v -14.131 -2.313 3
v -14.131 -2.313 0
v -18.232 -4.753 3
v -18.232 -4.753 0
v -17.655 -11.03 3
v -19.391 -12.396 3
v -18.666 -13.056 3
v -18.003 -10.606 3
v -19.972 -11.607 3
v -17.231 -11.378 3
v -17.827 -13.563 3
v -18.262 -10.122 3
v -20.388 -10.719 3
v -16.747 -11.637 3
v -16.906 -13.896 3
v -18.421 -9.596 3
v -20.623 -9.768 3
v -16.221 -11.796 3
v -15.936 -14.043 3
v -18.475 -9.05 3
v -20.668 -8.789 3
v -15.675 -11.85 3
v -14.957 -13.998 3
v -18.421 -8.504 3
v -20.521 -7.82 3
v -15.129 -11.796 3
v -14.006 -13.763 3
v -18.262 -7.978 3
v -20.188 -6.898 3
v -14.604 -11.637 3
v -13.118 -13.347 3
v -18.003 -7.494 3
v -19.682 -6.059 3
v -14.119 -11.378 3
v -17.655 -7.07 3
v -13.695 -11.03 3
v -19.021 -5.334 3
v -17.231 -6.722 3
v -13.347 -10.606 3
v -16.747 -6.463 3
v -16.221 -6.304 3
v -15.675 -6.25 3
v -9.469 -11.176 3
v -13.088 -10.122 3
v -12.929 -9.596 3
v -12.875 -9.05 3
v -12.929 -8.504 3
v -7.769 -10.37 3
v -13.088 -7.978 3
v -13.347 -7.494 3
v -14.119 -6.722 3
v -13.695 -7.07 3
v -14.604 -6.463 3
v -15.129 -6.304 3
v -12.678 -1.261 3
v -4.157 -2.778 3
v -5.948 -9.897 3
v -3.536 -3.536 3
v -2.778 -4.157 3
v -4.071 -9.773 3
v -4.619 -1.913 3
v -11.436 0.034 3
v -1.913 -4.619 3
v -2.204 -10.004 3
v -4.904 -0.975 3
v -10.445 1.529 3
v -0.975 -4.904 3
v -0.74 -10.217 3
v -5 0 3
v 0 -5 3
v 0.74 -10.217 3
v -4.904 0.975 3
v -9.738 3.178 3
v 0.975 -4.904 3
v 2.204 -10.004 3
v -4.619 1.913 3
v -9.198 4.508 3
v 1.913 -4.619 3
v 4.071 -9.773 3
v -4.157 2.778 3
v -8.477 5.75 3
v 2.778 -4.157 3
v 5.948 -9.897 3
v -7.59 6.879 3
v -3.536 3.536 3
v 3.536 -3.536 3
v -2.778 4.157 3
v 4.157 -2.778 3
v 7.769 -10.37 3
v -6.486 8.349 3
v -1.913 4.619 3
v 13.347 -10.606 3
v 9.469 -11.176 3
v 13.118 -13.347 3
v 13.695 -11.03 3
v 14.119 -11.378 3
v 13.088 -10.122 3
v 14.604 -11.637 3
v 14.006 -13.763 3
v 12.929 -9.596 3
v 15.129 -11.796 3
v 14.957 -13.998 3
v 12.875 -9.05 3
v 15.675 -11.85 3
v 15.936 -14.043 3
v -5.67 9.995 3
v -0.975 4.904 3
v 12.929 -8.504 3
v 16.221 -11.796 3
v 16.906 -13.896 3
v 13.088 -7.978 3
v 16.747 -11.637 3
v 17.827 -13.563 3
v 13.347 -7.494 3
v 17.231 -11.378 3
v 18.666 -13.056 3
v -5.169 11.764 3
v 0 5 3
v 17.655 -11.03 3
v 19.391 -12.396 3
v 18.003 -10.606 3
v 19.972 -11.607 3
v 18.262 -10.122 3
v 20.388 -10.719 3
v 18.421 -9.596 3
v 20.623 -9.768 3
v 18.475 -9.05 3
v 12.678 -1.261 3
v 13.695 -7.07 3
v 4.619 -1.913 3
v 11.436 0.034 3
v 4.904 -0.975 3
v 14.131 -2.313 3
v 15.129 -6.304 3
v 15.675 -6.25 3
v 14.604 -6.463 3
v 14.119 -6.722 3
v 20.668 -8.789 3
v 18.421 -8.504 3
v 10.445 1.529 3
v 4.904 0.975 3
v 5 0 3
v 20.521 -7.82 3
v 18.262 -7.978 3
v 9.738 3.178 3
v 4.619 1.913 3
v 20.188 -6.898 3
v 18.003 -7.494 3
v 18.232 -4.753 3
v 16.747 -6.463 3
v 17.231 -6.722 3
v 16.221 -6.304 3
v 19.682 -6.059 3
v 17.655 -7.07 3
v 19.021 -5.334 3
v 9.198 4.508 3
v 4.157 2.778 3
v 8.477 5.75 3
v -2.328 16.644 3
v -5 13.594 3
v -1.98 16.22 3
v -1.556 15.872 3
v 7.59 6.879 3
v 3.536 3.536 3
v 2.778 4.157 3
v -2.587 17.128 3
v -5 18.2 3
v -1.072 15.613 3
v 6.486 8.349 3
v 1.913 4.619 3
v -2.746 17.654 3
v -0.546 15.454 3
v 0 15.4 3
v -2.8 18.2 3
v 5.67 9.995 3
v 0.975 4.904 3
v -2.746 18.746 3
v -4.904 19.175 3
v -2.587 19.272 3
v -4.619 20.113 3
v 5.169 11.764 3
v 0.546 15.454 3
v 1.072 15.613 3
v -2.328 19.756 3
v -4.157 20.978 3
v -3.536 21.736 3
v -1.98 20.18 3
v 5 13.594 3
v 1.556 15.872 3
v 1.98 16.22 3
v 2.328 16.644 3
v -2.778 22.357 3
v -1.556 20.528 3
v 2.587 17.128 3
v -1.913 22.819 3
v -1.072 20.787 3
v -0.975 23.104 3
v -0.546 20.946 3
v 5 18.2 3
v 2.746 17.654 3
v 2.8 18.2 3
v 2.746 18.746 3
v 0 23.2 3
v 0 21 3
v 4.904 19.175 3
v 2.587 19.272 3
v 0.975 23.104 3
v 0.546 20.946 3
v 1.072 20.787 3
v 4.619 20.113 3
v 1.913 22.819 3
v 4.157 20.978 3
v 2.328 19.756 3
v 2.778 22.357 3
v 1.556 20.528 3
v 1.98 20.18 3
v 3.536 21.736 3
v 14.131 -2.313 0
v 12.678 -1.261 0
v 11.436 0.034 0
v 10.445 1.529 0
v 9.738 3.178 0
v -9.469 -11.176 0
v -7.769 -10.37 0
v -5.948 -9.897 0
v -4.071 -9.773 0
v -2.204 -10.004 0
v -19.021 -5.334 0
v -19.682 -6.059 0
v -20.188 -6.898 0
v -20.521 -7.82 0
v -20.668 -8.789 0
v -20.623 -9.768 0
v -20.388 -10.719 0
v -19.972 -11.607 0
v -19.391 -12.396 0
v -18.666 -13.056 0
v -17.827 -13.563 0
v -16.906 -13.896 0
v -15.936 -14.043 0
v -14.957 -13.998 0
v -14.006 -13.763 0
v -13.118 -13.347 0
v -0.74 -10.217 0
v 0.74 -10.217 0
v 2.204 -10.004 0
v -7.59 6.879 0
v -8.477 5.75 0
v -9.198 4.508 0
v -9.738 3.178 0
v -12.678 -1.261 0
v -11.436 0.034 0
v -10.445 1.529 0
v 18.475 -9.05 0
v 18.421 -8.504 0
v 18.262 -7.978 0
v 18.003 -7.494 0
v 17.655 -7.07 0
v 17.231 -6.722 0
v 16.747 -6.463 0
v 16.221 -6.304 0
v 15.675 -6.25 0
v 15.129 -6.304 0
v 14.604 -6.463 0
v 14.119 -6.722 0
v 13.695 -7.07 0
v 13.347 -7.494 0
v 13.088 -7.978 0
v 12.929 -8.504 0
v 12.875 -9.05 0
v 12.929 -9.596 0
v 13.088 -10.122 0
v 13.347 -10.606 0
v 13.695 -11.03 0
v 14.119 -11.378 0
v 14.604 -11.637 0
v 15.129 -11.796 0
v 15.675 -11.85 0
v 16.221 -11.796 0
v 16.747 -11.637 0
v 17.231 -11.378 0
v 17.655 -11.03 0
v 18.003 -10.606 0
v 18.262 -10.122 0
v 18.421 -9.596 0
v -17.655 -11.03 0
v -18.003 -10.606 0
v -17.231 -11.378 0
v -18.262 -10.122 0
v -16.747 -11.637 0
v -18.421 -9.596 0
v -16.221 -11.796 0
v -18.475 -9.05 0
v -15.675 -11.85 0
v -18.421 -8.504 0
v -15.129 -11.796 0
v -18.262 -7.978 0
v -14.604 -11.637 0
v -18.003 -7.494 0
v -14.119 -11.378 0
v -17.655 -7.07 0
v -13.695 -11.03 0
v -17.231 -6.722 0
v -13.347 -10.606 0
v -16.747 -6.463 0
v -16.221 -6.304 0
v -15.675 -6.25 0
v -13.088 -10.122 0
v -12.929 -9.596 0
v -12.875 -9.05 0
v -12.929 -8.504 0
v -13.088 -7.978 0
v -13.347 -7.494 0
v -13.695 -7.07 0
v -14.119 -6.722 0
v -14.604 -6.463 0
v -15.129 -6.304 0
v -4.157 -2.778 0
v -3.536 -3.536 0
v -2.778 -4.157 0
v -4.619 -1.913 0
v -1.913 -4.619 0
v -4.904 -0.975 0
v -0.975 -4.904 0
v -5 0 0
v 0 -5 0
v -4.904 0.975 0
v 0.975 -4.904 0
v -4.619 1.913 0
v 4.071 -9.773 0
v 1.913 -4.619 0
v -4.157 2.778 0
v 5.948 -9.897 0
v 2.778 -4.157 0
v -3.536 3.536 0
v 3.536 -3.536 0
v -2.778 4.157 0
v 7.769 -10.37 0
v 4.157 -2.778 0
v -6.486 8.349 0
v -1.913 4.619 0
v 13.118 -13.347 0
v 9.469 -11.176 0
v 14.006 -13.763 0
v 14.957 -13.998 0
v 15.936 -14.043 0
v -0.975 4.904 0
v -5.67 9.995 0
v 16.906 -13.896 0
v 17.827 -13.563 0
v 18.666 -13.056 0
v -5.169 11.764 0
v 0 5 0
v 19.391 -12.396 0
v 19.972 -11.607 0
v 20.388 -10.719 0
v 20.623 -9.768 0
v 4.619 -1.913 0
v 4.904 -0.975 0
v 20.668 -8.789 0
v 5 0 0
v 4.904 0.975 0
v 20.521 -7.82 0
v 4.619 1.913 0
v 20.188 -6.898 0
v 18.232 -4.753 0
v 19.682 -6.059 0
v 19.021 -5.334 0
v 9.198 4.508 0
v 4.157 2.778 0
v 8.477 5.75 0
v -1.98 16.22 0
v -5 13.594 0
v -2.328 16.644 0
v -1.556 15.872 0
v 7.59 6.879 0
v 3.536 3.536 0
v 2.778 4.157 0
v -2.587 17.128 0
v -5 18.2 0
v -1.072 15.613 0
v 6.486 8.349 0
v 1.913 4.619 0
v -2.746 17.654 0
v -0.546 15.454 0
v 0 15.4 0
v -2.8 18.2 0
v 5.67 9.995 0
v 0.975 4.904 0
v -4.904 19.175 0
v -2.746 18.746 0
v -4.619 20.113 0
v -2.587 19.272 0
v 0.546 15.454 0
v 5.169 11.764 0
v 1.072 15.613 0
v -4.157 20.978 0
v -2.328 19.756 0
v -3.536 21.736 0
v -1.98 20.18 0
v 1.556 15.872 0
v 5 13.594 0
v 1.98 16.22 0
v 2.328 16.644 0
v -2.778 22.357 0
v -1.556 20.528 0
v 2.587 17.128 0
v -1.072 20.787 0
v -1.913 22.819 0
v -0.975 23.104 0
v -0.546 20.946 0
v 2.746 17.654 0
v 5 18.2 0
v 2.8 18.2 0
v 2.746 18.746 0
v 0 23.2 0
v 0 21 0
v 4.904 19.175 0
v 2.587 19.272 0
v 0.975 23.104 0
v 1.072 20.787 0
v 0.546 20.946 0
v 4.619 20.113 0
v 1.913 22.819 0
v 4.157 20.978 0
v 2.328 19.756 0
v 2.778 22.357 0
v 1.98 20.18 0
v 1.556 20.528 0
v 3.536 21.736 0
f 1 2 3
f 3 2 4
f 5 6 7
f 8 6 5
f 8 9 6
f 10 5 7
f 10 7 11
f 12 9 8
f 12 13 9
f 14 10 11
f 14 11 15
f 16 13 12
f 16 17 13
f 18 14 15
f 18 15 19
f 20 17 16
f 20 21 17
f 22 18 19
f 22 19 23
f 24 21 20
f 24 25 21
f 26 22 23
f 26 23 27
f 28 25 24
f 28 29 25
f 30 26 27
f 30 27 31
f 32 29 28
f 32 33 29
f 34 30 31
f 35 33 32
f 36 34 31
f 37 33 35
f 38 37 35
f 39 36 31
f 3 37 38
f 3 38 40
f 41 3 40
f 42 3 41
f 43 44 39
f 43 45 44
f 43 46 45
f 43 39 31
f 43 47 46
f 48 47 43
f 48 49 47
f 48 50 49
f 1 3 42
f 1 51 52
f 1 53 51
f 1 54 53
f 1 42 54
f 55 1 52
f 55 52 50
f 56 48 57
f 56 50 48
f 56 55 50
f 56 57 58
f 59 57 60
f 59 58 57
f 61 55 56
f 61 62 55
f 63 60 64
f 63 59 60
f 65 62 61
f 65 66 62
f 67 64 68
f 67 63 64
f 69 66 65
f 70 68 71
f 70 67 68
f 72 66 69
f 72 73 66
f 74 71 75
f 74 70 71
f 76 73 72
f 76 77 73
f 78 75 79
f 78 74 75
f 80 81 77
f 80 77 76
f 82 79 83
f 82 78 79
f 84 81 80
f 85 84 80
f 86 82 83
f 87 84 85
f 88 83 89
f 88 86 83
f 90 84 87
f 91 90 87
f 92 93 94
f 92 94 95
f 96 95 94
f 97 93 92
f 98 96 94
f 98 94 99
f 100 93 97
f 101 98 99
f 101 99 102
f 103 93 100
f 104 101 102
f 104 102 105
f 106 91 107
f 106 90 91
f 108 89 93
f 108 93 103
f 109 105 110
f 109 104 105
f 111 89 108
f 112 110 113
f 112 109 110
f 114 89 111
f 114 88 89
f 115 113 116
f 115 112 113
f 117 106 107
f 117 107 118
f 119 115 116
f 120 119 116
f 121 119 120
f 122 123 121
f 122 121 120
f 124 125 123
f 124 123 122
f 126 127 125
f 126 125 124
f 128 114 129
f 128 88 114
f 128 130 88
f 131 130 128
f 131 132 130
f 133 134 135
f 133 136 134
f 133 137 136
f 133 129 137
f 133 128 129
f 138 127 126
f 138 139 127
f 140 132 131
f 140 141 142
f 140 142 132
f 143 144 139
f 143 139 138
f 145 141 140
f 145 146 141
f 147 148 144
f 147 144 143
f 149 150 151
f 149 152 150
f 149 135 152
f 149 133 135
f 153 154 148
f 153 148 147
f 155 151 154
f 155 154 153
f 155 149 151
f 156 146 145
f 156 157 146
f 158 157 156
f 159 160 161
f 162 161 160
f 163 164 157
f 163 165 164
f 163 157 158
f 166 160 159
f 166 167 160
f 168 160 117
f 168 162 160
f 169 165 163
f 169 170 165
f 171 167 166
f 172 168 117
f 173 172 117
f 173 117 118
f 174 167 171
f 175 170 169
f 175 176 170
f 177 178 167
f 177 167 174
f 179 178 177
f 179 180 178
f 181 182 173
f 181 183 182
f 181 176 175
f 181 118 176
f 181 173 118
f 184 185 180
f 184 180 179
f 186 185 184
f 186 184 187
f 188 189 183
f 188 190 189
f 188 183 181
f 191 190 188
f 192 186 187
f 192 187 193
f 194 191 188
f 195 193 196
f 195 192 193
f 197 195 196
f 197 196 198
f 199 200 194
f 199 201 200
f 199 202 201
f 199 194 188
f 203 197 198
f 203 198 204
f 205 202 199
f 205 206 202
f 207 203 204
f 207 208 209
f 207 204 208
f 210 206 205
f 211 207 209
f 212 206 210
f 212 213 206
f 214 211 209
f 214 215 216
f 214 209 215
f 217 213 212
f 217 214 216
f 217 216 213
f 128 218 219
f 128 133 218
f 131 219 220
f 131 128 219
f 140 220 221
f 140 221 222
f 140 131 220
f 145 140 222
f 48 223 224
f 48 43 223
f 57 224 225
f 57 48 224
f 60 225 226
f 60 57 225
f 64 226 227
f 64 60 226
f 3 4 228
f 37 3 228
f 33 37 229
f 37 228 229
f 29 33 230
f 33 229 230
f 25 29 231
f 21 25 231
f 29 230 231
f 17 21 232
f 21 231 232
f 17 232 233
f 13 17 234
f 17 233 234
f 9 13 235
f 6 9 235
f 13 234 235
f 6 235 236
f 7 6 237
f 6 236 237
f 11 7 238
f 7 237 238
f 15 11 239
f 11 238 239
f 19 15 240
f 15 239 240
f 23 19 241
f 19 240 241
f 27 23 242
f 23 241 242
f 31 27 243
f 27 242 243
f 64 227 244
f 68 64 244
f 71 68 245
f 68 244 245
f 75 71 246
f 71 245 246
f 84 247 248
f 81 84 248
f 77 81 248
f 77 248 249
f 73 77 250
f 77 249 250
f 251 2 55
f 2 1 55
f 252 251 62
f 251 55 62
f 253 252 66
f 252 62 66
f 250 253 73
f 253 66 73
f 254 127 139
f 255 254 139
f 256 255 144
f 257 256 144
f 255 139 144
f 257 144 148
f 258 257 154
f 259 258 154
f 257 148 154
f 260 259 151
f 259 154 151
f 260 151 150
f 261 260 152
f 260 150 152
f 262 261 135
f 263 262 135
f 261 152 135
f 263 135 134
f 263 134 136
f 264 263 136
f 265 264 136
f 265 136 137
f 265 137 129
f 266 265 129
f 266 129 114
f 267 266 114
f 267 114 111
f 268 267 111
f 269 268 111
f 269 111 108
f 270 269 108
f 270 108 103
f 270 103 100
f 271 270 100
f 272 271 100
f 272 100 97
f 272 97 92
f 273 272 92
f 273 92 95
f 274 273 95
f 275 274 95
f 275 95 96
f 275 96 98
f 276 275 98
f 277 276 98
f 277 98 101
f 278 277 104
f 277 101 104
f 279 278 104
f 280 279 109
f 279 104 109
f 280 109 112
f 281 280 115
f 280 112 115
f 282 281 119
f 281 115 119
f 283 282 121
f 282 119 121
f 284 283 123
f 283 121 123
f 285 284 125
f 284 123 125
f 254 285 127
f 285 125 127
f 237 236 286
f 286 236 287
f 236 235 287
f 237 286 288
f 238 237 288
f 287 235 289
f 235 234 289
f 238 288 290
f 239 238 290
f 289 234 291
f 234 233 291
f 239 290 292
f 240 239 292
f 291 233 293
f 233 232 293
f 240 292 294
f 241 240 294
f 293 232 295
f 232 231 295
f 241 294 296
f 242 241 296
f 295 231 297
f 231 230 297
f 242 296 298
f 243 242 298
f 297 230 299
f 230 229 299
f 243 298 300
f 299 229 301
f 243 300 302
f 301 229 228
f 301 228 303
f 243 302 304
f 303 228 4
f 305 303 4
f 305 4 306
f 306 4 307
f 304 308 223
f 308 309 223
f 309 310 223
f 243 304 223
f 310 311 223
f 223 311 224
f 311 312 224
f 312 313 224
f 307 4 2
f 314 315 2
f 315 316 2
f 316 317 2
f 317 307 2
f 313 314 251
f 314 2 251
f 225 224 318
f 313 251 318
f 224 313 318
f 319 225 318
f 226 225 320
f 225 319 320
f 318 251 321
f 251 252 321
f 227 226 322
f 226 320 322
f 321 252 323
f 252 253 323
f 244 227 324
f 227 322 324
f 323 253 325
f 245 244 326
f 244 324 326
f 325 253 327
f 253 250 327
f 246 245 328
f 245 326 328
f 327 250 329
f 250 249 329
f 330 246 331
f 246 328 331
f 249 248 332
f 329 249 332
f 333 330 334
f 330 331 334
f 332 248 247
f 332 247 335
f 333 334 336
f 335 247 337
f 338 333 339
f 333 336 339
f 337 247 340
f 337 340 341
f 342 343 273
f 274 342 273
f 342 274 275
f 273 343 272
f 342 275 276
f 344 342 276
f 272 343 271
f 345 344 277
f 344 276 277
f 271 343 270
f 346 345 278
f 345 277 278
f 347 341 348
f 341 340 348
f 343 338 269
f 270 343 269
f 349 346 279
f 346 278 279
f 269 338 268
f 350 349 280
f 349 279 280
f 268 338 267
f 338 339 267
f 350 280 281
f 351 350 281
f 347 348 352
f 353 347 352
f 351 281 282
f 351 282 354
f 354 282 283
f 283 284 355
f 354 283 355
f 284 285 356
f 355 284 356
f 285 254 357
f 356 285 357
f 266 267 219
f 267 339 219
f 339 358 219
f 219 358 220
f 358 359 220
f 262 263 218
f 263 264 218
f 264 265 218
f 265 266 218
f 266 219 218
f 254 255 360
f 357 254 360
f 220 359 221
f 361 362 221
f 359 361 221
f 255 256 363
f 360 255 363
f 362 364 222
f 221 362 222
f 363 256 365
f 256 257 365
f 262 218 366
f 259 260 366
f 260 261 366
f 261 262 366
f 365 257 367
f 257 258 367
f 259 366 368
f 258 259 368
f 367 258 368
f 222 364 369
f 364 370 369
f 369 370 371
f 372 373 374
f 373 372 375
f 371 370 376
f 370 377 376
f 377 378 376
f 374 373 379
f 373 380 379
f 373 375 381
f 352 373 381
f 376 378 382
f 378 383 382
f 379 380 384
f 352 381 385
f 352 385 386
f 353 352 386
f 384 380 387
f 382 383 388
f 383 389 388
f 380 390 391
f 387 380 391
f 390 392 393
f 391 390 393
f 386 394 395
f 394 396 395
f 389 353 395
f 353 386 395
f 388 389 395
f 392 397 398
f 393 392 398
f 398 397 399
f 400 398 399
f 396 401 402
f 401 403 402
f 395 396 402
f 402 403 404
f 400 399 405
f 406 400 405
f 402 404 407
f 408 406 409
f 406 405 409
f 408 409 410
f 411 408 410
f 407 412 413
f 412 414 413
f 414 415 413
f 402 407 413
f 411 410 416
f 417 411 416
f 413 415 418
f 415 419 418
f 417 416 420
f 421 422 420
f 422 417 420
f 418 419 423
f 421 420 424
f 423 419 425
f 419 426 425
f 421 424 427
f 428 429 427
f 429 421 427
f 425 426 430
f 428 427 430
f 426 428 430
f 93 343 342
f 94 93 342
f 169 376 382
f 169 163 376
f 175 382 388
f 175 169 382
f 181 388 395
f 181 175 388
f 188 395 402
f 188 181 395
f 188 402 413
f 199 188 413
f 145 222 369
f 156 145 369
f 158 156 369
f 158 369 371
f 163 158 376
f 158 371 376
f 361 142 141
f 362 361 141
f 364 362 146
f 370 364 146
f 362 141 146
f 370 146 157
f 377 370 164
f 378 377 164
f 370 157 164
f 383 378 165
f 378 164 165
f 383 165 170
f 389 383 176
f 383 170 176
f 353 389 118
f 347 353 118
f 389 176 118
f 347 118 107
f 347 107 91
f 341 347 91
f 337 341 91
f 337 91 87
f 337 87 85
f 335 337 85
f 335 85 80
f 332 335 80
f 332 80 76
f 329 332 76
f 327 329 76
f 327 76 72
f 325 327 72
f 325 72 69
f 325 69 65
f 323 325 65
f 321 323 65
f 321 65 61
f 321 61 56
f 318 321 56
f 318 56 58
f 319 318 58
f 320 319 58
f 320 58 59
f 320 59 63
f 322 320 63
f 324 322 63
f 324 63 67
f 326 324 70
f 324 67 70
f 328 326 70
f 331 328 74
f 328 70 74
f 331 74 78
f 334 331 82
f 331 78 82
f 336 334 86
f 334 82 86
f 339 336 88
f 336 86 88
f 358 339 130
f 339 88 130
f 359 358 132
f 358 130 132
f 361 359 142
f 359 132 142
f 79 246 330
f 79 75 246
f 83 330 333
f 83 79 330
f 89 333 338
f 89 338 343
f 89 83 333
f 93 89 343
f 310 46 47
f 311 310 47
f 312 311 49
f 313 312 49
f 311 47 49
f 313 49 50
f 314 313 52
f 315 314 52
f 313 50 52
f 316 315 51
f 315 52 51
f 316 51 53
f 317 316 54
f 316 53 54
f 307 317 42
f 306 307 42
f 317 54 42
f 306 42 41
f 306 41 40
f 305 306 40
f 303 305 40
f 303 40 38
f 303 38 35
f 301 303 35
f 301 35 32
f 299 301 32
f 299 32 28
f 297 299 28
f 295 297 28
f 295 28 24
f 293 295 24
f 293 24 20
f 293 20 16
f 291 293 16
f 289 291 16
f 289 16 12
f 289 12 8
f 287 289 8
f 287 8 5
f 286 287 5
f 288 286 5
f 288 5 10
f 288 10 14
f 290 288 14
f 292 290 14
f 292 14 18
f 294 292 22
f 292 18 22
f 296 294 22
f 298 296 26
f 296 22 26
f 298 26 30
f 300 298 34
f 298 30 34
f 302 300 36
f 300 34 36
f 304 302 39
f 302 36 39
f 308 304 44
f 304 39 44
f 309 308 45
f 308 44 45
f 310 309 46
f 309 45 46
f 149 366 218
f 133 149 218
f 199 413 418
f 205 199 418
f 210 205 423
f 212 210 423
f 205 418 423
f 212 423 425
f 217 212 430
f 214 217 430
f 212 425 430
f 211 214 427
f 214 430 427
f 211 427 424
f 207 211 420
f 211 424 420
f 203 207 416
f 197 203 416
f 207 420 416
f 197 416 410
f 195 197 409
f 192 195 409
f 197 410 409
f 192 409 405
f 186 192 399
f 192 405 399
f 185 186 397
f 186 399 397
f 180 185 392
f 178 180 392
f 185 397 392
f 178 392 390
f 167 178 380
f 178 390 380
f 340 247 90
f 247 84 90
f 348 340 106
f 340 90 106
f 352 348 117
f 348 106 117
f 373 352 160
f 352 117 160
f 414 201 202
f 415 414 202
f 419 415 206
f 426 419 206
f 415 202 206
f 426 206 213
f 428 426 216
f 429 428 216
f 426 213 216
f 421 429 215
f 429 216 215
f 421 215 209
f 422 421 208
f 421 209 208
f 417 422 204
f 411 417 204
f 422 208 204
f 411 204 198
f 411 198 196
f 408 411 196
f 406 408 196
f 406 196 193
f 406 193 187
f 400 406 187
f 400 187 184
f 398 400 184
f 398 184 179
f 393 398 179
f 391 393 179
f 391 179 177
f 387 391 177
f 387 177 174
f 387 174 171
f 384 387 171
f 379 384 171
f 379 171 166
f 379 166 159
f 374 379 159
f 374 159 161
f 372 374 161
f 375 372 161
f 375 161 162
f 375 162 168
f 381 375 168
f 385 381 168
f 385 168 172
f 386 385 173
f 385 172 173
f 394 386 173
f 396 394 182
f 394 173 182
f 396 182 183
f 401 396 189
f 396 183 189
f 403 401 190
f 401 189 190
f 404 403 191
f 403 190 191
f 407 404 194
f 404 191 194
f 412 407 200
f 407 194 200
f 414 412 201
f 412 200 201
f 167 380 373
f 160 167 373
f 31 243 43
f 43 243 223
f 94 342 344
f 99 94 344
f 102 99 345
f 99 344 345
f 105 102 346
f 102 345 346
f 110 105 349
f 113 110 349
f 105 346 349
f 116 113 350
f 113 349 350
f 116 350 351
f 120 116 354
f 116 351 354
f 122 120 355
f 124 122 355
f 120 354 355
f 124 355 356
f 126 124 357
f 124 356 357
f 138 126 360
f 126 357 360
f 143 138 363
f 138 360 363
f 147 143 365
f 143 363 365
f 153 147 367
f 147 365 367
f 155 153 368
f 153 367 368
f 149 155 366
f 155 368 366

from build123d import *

# Parameters (mm, degrees)
SALIENTE_EXTRUIR1_DEPTH = 3
CROQUIS2_R              = 2.8
CORTAR_EXTRUIR1_DEPTH   = 10
CROQUIS3_R              = 5
CORTAR_EXTRUIR2_DEPTH   = 10
REDONDEO1_R             = 10


with BuildPart() as part:
    # Croquis1 → Saliente-Extruir1 (new body)
    with BuildSketch(Plane.XY):
        with BuildLine():
            Line((-13.118348224, -13.346885602), (-5.358962429, -8.729934305))
            ThreePointArc((-5.358962429, -8.729934305), (0, -10.243545836), (5.358962429, -8.729934305))
            Line((5.358962429, -8.729934305), (13.118348224, -13.346885602))
            ThreePointArc((13.118348224, -13.346885602), (19.97194541, -11.606711584), (18.231771393, -4.753114398))
            Line((18.231771393, -4.753114398), (10.243545836, 0))
            ThreePointArc((10.243545836, 0), (8.83594818, 5.182301714), (5, 8.94037087))
            Line((5, 8.94037087), (5, 18.2))
            ThreePointArc((5, 18.2), (0, 23.2), (-5, 18.2))
            Line((-5, 18.2), (-5, 8.94037087))
            ThreePointArc((-5, 8.94037087), (-8.83594818, 5.182301714), (-10.243545836, 0))
            Line((-10.243545836, 0), (-18.231771393, -4.753114398))
            ThreePointArc((-18.231771393, -4.753114398), (-19.97194541, -11.606711584), (-13.118348224, -13.346885602))
        make_face()
    extrude(amount=SALIENTE_EXTRUIR1_DEPTH)

    # Croquis2 → Cortar-Extruir1 (cut)
    with BuildSketch(Plane.XY.offset(3)):
        with Locations((0, 18.2)):
            Circle(CROQUIS2_R)
        with Locations((15.675059808, -9.05)):
            Circle(CROQUIS2_R)
        with Locations((-15.675059808, -9.05)):
            Circle(CROQUIS2_R)
    extrude(amount=-CORTAR_EXTRUIR1_DEPTH, mode=Mode.SUBTRACT)

    # Croquis3 → Cortar-Extruir2 (cut)
    with BuildSketch(Plane.XY.offset(3)):
        Circle(CROQUIS3_R)
    extrude(amount=-CORTAR_EXTRUIR2_DEPTH, mode=Mode.SUBTRACT)

    # Redondeo1
    redondeo1_edges = [part.edges().sort_by_distance(p)[0] for p in [
        (-10.243545836, 0, 1.5),
        (-5, 8.94037087, 1.5),
        (5, 8.94037087, 1.5),
        (10.243545836, 0, 1.5),
        (5.358962429, -8.729934305, 1.5),
        (-5.358962429, -8.729934305, 1.5),
    ]]
    fillet(redondeo1_edges, radius=REDONDEO1_R)


solid = part.part
